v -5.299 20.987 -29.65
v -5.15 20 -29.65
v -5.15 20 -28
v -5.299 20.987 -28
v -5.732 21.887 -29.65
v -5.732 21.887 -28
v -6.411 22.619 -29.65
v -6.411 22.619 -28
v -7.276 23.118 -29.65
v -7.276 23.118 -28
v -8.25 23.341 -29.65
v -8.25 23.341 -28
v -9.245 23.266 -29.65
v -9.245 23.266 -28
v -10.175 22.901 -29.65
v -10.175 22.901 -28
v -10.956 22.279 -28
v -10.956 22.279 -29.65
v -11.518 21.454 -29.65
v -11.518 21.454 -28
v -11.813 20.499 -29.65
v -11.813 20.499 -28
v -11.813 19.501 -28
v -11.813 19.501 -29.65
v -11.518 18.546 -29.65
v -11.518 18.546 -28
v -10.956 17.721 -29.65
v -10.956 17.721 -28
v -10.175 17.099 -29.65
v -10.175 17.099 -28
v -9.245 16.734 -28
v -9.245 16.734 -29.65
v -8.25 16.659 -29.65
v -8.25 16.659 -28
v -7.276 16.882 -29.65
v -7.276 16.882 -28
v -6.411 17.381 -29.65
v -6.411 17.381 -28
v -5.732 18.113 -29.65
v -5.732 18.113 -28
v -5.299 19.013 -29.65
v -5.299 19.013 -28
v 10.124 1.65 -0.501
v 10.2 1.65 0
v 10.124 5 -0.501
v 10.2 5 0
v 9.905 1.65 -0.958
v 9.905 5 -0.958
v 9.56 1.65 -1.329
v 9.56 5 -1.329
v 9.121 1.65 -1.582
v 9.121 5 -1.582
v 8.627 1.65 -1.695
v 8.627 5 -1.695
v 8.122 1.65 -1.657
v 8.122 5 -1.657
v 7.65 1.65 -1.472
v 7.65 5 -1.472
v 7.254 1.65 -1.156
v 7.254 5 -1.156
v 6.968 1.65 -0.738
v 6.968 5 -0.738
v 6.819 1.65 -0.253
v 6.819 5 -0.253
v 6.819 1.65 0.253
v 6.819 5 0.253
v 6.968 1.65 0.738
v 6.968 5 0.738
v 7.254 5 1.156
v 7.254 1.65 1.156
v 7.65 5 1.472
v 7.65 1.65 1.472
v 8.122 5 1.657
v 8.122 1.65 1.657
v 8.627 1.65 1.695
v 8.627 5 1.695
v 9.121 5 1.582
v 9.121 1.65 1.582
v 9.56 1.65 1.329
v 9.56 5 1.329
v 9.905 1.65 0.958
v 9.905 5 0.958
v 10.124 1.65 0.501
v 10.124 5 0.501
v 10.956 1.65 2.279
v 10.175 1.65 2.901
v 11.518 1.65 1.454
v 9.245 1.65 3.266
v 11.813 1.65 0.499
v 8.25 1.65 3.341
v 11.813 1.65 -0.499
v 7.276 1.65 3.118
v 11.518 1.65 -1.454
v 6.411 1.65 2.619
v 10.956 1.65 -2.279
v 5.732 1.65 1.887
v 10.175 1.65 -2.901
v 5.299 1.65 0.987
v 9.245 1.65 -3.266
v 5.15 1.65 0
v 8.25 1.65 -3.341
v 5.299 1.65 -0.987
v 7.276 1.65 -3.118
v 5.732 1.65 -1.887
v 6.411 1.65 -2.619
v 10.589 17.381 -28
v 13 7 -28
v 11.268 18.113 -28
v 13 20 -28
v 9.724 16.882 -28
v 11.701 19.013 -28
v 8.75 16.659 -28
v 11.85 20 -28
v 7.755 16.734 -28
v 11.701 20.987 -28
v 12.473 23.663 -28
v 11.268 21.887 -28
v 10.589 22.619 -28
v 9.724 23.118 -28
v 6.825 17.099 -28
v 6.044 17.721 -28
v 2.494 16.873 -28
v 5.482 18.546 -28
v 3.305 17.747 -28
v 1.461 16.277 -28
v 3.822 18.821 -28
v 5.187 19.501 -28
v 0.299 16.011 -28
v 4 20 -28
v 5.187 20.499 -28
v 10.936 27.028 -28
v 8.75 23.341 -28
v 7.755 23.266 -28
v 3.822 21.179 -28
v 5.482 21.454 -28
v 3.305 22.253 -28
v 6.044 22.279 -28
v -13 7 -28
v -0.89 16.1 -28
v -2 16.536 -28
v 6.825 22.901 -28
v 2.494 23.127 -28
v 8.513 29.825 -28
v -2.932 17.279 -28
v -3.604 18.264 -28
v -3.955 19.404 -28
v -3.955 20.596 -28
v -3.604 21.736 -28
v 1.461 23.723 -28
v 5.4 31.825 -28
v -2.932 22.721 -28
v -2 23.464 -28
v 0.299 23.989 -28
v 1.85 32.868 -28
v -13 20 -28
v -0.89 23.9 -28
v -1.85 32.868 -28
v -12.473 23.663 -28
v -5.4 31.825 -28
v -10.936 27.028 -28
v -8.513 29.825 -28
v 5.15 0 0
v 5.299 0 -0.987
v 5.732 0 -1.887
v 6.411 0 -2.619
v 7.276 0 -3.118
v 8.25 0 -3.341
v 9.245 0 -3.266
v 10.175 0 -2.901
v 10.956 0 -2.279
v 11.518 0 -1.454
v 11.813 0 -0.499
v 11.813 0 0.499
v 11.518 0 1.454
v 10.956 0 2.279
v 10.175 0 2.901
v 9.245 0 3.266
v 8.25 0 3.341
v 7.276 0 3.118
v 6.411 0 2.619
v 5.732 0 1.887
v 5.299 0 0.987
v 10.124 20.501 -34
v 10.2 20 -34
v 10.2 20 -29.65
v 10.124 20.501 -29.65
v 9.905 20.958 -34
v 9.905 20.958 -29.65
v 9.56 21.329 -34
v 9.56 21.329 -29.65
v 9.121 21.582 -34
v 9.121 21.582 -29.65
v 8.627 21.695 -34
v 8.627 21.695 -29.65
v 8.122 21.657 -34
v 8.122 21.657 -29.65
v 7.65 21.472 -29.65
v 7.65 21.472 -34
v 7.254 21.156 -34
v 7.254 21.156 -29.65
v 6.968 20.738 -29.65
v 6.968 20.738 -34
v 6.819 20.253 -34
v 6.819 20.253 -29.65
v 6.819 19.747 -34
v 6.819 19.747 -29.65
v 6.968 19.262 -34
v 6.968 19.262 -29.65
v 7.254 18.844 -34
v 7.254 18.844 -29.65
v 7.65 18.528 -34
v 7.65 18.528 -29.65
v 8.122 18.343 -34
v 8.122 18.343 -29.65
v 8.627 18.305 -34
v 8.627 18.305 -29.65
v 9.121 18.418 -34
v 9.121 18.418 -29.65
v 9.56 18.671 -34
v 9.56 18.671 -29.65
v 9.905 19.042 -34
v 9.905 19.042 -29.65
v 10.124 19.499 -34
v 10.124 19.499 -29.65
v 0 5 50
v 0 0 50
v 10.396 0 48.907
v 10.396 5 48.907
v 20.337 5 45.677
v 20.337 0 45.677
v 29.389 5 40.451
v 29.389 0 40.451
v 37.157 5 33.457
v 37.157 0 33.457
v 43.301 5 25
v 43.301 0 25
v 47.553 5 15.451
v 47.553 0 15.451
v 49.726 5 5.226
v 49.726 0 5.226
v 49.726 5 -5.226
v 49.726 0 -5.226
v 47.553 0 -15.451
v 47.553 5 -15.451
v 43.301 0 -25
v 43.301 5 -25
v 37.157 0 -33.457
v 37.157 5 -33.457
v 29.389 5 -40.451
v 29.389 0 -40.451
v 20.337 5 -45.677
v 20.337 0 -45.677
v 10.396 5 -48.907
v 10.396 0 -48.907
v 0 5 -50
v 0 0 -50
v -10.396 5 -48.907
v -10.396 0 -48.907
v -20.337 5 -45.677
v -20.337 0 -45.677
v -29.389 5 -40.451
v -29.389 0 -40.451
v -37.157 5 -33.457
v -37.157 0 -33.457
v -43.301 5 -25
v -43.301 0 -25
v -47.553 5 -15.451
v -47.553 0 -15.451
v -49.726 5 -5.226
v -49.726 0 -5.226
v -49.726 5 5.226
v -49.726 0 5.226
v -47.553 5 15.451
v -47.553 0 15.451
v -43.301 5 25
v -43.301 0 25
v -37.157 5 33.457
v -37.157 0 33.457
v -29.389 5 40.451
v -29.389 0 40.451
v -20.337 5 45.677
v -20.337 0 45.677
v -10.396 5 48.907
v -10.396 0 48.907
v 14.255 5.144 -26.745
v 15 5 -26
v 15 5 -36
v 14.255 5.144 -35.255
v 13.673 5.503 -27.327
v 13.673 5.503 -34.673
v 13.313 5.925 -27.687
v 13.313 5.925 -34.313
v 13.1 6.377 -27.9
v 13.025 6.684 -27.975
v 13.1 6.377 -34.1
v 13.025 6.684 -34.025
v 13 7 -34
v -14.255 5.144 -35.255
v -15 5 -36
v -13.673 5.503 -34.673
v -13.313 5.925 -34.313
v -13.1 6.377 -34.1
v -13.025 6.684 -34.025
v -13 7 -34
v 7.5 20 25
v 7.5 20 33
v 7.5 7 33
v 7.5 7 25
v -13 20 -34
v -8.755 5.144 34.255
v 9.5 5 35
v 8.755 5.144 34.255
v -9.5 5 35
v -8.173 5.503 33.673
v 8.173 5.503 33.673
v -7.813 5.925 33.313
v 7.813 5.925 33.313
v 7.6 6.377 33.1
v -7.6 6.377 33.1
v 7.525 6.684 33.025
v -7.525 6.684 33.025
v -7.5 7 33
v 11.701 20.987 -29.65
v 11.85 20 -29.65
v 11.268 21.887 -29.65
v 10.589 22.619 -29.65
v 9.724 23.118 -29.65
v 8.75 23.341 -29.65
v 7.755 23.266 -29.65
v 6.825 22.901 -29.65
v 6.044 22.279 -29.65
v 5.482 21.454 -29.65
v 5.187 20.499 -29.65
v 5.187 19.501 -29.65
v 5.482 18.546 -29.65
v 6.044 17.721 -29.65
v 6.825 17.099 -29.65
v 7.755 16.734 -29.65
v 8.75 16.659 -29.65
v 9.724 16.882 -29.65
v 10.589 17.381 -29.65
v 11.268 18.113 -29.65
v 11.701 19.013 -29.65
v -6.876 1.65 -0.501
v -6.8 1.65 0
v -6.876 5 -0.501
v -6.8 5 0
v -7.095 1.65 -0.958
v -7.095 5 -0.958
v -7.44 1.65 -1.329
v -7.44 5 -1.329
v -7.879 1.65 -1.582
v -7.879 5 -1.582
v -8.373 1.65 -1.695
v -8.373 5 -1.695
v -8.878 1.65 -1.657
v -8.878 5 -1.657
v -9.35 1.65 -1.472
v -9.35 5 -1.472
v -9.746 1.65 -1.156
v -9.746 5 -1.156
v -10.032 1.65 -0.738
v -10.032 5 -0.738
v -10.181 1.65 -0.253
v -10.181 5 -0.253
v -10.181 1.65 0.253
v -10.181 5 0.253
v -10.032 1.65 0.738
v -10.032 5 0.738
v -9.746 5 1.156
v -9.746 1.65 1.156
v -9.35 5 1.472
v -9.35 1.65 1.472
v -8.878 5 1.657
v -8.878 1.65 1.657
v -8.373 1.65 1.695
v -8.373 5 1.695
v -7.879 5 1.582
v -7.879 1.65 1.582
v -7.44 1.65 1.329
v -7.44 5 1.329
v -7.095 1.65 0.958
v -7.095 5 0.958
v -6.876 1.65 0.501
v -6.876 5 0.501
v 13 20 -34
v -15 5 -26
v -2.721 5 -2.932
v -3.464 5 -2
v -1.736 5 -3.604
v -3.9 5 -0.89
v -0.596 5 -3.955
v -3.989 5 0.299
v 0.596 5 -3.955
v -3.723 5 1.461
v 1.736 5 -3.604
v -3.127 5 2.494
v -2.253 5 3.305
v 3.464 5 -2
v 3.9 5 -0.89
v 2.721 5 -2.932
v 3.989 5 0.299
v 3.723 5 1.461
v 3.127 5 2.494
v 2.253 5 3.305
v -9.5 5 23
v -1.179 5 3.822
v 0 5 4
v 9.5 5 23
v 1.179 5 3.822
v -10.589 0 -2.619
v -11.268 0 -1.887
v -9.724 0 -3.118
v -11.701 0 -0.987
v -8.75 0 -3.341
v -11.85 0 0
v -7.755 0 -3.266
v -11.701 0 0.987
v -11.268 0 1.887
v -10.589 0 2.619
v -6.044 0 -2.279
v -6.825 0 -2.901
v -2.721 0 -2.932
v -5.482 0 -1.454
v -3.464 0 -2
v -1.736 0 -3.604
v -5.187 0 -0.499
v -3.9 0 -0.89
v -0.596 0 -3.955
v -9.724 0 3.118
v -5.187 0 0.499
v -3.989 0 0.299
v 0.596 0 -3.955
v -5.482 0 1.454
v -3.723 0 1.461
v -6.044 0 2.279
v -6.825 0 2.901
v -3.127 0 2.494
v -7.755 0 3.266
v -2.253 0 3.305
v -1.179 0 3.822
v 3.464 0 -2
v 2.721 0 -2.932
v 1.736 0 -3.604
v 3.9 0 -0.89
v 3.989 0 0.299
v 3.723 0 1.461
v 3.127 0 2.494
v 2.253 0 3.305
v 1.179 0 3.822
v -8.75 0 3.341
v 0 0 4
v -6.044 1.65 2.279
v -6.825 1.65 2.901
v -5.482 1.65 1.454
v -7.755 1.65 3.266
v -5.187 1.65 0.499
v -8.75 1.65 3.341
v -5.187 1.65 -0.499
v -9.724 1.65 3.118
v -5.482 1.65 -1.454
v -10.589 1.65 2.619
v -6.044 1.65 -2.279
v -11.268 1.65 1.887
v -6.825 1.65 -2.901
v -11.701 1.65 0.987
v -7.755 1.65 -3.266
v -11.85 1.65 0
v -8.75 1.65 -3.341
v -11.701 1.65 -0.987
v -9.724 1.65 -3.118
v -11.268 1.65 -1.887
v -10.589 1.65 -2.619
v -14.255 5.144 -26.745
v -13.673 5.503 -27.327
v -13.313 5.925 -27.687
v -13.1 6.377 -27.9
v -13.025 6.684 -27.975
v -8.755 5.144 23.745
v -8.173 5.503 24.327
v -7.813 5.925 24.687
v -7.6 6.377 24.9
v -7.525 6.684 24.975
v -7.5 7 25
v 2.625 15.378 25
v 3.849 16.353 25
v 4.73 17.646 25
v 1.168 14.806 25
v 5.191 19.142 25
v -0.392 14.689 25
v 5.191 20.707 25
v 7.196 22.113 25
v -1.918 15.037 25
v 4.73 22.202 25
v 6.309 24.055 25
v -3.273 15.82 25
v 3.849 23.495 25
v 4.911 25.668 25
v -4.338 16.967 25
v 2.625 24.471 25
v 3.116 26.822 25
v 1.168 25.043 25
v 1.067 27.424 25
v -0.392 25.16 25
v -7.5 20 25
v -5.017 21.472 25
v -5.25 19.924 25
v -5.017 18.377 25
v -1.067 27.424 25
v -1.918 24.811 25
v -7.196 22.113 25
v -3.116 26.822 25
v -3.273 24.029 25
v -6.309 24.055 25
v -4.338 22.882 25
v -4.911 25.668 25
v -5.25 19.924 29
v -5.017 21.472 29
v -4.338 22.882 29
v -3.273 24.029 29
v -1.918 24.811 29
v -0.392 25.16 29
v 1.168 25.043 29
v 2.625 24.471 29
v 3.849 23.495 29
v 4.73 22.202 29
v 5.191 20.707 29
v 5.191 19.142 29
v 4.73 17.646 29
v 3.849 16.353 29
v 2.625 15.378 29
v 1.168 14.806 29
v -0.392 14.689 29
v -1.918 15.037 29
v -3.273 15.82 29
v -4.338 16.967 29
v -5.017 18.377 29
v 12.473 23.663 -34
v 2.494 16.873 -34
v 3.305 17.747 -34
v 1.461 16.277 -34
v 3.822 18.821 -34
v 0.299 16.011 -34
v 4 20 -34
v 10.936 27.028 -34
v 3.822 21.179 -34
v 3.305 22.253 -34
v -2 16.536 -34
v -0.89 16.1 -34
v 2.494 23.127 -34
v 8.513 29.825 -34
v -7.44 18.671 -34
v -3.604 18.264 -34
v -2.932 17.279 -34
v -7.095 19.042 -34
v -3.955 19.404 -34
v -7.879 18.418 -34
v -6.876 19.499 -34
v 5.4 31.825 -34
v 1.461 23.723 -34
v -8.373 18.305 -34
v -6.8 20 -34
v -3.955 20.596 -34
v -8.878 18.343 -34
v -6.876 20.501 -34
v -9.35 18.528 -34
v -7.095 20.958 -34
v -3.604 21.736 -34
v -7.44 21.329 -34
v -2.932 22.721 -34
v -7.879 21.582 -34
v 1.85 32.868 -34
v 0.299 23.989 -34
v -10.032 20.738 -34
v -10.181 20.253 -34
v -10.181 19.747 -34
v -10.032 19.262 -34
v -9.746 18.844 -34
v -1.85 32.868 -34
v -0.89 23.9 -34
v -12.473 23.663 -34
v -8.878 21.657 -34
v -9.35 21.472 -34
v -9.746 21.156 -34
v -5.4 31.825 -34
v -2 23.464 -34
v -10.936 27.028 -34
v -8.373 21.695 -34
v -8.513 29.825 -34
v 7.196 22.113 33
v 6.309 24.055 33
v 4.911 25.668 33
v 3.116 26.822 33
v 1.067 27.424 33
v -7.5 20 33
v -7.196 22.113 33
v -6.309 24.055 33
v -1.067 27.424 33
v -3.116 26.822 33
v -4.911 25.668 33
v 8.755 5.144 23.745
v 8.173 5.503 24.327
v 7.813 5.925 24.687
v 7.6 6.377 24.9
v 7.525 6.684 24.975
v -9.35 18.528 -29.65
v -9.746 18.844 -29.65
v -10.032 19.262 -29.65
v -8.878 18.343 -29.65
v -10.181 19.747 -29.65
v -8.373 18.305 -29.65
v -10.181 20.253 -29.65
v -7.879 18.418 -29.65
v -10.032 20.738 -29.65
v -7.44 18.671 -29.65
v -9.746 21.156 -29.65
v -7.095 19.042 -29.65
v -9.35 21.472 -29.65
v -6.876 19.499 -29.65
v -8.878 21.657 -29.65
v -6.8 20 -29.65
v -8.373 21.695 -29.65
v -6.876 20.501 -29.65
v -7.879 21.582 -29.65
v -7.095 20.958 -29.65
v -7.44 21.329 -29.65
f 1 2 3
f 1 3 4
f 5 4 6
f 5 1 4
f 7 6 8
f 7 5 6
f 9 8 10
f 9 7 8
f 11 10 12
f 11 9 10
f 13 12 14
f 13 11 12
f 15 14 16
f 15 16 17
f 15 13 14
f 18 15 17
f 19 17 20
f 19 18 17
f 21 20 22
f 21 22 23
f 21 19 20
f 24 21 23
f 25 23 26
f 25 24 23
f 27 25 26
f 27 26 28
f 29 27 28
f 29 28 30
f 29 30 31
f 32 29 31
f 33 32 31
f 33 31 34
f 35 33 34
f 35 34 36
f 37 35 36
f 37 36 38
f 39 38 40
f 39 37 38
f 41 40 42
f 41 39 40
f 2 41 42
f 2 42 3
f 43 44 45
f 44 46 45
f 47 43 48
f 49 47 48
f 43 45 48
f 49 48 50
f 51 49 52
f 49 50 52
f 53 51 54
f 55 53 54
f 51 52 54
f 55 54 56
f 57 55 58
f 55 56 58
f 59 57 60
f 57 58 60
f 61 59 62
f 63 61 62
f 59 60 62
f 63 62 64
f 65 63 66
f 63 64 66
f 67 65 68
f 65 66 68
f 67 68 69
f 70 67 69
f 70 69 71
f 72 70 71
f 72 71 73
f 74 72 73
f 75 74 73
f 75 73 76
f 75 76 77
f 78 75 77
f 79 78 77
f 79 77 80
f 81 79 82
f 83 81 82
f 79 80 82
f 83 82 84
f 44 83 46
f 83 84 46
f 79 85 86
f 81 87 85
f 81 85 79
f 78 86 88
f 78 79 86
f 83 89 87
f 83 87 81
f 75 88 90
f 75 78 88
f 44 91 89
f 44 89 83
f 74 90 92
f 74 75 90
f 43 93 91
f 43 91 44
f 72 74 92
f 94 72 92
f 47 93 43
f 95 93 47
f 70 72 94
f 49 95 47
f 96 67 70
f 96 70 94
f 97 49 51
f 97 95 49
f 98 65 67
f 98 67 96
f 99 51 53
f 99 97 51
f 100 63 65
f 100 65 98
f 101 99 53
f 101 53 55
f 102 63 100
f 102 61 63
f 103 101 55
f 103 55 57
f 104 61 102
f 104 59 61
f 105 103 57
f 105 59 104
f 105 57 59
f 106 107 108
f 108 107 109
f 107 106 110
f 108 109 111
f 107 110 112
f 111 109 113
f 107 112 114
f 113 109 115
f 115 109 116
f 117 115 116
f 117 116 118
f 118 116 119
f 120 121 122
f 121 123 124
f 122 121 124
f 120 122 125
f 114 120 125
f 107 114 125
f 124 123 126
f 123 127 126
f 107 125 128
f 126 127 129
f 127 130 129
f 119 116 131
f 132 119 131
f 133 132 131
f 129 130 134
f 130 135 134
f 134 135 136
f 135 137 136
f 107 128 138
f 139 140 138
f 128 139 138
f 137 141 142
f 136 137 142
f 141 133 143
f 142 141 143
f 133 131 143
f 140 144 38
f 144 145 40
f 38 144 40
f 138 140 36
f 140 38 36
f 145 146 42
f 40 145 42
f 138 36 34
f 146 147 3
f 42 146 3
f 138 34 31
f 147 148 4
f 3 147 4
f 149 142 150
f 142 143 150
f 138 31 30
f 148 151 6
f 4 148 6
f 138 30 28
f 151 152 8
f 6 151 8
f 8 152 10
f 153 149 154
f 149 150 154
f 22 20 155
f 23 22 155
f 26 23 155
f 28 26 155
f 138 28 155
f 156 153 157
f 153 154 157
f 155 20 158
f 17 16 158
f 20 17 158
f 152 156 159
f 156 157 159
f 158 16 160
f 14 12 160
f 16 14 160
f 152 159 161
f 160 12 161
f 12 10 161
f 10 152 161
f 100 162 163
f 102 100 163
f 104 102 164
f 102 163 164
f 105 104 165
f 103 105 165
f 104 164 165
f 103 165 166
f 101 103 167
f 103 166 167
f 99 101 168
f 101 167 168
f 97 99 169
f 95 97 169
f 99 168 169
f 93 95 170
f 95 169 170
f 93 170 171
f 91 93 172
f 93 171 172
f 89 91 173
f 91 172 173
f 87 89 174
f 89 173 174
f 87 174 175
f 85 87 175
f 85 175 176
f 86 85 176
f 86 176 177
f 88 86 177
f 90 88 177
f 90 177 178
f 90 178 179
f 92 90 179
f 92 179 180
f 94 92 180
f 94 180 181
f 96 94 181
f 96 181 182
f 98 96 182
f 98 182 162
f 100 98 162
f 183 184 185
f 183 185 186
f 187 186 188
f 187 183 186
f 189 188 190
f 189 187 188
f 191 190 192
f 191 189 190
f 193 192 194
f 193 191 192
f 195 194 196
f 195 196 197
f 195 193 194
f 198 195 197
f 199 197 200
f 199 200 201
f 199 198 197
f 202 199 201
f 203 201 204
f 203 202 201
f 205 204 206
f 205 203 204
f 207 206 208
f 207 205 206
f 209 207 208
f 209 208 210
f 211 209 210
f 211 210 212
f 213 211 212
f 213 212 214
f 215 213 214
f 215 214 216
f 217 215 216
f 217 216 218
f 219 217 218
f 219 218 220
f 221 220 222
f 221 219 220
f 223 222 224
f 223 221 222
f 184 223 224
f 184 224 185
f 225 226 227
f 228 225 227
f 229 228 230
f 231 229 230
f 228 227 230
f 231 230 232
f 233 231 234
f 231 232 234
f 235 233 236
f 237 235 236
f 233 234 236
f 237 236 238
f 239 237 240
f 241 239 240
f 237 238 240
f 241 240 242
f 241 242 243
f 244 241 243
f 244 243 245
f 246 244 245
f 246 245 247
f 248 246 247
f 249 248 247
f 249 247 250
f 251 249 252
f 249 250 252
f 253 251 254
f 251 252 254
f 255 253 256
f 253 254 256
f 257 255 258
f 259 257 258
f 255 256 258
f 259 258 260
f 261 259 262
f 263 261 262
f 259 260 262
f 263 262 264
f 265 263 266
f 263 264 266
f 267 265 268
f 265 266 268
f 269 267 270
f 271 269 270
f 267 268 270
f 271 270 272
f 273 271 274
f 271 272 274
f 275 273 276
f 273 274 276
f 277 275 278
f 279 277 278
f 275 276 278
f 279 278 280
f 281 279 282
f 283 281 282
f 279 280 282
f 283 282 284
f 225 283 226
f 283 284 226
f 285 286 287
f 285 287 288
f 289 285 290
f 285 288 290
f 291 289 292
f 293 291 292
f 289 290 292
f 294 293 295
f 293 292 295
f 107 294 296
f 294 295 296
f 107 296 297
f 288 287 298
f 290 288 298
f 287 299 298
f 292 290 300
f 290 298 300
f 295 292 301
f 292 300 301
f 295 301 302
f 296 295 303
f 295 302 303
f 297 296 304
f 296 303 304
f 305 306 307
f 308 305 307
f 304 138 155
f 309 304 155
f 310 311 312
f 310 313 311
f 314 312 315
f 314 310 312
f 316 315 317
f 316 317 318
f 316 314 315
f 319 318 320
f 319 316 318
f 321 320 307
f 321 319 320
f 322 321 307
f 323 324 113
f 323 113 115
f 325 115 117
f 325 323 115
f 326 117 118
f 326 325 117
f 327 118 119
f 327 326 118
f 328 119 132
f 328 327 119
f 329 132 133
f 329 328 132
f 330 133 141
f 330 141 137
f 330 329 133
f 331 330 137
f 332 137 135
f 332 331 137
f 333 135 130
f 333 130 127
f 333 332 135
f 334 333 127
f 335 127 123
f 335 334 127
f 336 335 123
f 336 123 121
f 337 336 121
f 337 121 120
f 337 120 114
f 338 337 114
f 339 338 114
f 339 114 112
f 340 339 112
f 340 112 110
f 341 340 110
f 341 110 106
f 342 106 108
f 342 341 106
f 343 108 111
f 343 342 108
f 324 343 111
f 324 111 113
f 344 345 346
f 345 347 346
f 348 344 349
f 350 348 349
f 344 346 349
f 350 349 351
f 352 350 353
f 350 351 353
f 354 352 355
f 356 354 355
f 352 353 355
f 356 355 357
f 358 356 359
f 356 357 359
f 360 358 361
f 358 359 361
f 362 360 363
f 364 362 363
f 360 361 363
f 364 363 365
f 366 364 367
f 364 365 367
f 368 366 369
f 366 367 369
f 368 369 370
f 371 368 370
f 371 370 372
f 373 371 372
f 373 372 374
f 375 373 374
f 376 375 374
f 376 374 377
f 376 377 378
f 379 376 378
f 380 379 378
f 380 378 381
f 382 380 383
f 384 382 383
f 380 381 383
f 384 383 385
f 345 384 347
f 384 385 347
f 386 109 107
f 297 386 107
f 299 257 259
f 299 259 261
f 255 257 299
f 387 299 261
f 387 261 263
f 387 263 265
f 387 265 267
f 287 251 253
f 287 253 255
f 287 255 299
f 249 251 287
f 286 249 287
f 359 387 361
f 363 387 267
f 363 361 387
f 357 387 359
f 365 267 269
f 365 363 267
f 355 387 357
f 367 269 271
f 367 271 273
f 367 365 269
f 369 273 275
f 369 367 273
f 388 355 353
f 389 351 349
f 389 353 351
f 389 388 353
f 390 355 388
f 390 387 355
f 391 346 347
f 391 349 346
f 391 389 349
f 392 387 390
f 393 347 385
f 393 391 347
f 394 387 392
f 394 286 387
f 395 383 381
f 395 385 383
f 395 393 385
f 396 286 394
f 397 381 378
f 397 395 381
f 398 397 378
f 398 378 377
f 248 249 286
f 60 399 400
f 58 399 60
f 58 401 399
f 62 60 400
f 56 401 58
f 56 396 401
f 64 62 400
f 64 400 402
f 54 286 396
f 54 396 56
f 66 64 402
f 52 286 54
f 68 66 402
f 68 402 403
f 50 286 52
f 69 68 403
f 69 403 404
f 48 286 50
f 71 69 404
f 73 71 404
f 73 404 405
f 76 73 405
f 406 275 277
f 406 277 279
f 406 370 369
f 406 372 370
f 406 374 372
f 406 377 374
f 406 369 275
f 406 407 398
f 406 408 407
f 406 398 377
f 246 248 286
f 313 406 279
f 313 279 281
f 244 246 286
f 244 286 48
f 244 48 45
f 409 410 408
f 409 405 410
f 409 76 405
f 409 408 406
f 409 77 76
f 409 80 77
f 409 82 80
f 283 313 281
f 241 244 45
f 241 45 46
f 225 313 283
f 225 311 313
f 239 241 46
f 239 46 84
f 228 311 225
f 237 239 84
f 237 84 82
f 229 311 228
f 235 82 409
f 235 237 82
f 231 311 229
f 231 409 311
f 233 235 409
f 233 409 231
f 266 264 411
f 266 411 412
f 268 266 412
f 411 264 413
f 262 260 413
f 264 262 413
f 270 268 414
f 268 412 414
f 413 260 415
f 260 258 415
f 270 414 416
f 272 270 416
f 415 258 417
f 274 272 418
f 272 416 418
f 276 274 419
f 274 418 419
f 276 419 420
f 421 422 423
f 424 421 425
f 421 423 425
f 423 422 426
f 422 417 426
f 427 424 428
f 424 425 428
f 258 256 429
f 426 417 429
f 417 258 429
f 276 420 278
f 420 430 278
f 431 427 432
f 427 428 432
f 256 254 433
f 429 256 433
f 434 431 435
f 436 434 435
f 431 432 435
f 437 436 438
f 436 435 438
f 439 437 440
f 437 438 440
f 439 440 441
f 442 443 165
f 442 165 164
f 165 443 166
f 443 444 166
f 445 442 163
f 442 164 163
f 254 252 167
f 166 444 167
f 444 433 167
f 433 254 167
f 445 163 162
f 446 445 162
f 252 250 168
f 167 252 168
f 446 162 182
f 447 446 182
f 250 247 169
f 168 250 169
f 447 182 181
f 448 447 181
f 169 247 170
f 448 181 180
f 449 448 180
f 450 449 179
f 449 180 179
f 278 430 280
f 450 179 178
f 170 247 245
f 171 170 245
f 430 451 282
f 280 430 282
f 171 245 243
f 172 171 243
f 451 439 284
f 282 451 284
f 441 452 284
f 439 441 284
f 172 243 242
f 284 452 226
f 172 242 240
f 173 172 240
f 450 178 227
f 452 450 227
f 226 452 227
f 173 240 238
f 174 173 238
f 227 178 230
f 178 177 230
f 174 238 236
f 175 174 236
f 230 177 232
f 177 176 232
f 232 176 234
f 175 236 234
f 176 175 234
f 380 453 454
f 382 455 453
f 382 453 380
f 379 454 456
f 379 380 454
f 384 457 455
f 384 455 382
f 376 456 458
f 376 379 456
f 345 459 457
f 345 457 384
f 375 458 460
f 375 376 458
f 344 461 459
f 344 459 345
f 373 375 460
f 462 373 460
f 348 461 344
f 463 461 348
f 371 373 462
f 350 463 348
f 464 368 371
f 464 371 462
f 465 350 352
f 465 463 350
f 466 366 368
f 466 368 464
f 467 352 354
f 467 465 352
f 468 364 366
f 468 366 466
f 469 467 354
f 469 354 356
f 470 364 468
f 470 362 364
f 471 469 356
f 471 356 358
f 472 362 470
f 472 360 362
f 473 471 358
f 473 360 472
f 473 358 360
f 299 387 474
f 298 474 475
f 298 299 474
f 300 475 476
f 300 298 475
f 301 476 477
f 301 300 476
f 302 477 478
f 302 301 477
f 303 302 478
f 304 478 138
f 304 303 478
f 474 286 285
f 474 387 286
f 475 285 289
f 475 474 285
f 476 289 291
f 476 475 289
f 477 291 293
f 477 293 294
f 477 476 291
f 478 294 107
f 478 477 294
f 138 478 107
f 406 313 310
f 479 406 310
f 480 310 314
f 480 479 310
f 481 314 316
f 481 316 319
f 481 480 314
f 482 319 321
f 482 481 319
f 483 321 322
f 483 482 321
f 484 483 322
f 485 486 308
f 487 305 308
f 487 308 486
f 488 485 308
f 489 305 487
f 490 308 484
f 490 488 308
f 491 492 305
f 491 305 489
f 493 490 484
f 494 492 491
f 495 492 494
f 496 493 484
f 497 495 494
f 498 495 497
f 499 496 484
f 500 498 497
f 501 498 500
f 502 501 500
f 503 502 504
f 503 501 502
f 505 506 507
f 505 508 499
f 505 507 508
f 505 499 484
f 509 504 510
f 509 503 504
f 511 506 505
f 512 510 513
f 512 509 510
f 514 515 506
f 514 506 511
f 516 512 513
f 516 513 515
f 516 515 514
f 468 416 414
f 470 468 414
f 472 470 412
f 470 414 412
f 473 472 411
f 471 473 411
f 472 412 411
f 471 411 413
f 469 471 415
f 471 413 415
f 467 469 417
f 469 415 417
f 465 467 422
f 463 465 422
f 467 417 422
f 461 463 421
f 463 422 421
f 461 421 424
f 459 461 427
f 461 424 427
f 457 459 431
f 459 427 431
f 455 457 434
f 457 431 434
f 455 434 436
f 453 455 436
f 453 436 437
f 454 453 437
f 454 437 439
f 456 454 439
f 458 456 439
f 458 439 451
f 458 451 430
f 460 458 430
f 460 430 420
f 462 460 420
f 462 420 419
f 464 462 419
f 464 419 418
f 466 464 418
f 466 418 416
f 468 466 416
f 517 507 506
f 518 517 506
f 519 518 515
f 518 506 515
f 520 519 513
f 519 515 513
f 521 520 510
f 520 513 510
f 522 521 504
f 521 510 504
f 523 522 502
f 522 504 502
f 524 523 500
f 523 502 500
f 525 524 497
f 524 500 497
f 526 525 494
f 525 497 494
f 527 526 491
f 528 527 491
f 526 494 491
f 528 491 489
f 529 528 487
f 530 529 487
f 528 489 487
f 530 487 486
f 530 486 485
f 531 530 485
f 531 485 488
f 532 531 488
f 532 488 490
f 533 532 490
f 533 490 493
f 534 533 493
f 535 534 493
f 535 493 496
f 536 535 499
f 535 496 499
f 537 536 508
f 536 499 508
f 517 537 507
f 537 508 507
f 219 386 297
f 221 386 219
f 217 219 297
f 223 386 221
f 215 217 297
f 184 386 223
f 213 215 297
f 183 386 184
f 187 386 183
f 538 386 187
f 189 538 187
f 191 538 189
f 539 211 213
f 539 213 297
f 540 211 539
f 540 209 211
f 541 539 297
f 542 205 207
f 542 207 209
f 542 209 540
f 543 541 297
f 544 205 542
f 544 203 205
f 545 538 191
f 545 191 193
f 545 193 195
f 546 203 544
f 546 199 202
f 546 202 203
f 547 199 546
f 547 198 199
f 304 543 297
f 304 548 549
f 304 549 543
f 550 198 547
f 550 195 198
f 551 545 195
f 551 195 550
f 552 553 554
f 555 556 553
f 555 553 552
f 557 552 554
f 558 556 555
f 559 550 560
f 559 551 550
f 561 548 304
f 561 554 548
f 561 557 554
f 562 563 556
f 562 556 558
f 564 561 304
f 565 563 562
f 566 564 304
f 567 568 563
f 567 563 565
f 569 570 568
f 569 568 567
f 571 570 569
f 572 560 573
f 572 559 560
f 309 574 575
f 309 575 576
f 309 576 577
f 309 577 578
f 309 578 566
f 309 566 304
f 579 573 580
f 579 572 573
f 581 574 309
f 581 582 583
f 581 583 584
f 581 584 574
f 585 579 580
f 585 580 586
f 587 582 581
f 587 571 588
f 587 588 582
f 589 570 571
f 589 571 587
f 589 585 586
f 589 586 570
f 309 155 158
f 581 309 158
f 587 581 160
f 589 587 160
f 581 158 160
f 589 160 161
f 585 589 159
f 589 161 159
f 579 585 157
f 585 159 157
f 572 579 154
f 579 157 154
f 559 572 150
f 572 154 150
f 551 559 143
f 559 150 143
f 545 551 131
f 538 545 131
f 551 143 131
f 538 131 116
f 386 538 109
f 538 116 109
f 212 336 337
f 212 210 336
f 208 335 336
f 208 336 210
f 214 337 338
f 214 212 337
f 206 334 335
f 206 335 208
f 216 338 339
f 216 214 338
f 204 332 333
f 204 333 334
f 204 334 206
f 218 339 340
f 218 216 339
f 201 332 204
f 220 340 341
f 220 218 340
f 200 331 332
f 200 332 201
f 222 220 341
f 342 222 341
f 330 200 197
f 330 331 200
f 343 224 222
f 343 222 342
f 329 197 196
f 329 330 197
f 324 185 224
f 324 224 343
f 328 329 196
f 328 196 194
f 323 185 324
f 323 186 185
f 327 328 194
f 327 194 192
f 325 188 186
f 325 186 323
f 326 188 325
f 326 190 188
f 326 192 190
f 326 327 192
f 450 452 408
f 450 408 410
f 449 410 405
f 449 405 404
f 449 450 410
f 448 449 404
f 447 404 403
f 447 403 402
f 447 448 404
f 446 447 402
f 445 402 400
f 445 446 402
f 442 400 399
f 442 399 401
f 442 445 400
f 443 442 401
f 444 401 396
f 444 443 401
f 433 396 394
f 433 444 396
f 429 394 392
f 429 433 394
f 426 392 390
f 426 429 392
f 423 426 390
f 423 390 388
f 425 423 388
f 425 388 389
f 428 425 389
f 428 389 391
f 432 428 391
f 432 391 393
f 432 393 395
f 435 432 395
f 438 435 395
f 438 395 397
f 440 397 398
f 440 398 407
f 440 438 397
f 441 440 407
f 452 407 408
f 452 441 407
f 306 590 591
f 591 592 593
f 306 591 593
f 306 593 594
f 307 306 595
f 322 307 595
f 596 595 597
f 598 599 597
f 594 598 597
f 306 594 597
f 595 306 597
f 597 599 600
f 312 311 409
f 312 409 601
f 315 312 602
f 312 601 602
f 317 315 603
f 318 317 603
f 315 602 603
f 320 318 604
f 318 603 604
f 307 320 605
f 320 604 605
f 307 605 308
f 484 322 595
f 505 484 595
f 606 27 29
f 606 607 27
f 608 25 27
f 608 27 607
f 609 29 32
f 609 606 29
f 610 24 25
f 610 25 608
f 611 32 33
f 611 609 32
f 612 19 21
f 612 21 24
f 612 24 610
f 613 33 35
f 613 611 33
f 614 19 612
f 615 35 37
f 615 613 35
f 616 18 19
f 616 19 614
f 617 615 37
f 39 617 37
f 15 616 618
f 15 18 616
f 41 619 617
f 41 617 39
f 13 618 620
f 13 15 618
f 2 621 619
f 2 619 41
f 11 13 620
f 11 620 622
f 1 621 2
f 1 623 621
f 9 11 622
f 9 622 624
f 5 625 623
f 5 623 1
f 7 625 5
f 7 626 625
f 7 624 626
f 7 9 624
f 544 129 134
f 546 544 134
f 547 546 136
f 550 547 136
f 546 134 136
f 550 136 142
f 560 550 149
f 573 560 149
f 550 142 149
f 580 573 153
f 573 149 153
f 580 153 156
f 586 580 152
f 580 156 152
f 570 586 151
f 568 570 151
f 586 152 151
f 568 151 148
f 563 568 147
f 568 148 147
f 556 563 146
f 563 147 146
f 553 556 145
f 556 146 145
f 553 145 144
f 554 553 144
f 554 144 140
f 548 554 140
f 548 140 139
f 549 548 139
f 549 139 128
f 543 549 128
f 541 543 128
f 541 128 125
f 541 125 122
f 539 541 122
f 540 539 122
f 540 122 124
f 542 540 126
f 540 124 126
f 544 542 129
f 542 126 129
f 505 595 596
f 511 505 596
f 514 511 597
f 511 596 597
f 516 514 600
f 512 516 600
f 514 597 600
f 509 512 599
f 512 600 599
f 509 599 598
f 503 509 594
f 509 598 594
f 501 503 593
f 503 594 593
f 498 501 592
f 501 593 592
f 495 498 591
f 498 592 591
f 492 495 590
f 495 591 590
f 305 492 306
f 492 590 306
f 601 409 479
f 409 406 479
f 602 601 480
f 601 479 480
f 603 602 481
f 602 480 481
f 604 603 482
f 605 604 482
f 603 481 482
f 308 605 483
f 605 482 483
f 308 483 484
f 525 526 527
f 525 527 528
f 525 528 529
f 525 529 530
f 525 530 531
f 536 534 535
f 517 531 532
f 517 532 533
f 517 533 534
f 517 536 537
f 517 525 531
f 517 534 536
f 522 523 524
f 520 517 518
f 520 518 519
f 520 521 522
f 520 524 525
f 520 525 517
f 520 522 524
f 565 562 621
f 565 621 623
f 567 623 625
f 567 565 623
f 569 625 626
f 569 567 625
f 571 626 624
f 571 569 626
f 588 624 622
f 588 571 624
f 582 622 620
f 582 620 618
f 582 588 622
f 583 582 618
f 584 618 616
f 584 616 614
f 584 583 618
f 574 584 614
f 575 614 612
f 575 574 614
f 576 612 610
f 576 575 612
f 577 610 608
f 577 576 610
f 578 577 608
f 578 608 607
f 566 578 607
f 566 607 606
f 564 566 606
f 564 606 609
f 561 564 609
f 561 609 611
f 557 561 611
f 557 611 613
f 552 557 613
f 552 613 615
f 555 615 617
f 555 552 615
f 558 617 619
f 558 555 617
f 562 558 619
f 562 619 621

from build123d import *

# Parameters (mm, degrees)
SKETCH1_R                       = 50
SKETCH1_R_2                     = 4
BOSS_EXTRUDE1_DEPTH             = 5
BOSS_EXTRUDE4_DEPTH             = 6
BOSS_EXTRUDE5_DEPTH             = 8
CBORE_FOR_M3_SBHCS1_D           = 3.4
CBORE_FOR_M3_SBHCS1_CBORE_D     = 6.7
CBORE_FOR_M3_SBHCS1_CBORE_DEPTH = 1.65
CBORE_START                     = -29.65
CBORE_FOR_M3_SBHCS2_OUTLINE_R   = 3.35
CBORE_FOR_M3_SBHCS2_DEPTH       = 1.65
CBORE_START_2                   = -34
CBORE_FOR_M3_SBHCS2_2_OUTLINE_R = 1.7
CBORE_FOR_M3_SBHCS2_2_DEPTH     = 4.35
SKETCH29_R                      = 4
CUT_EXTRUDE1_DEPTH              = 6
SKETCH30_R                      = 5.25
CUT_EXTRUDE2_DEPTH              = 4
FILLET1_R                       = 2


# Read off the part's stored shape, not the designer's step: CBORE for M3 SBHCS2
with BuildPart() as part:
    # Sketch1 → Boss-Extrude1 (new body)
    with BuildSketch(Plane(origin=(0, 0, 0), x_dir=(1, 0, 0), z_dir=(0, 1, 0))):
        with Locations(Location((0, 0, 0), (0, 0, 270))):
            Circle(SKETCH1_R)
        with Locations(Location((0, 0, 0), (0, 0, 270))):
            Circle(SKETCH1_R_2, mode=Mode.SUBTRACT)
    extrude(amount=BOSS_EXTRUDE1_DEPTH)

    # Sketch2 → Boss-Extrude4 (add)
    with BuildSketch(Plane.XY.offset(-28)):
        with BuildLine():
            Line((-13, 5), (-13, 20))
            ThreePointArc((-13, 20), (0, 33), (13, 20))
            Line((13, 20), (13, 5))
            Line((13, 5), (-13, 5))
        make_face()
    extrude(amount=-BOSS_EXTRUDE4_DEPTH)

    # Sketch24 → Boss-Extrude5 (add)
    with BuildSketch(Plane.XY.offset(33)):
        with BuildLine():
            Line((-7.5, 5), (-7.5, 20))
            ThreePointArc((-7.5, 20), (0, 27.5), (7.5, 20))
            Line((7.5, 20), (7.5, 5))
            Line((7.5, 5), (-7.5, 5))
        make_face()
    extrude(amount=-BOSS_EXTRUDE5_DEPTH)

    # CBORE for M3 SBHCS1 (through all)
    with Locations(Plane(origin=(0, 0, 0), x_dir=(-1, 0, 0), z_dir=(0, -1, 0))):
        with Locations((-8.5, 0), (8.5, 0)):
            CounterBoreHole(CBORE_FOR_M3_SBHCS1_D / 2, CBORE_FOR_M3_SBHCS1_CBORE_D / 2, CBORE_FOR_M3_SBHCS1_CBORE_DEPTH)

    # CBORE for M3 SBHCS2 outline → CBORE for M3 SBHCS2 (cut)
    with BuildSketch(Plane.XY.offset(CBORE_START)):
        with Locations((-8.5, 20)):
            Circle(CBORE_FOR_M3_SBHCS2_OUTLINE_R)
        with Locations((8.5, 20)):
            Circle(CBORE_FOR_M3_SBHCS2_OUTLINE_R)
    extrude(amount=CBORE_FOR_M3_SBHCS2_DEPTH, mode=Mode.SUBTRACT)

    # CBORE for M3 SBHCS2 2 outline → CBORE for M3 SBHCS2 2 (cut)
    with BuildSketch(Plane.XY.offset(CBORE_START_2)):
        with Locations((-8.5, 20)):
            Circle(CBORE_FOR_M3_SBHCS2_2_OUTLINE_R)
        with Locations((8.5, 20)):
            Circle(CBORE_FOR_M3_SBHCS2_2_OUTLINE_R)
    extrude(amount=CBORE_FOR_M3_SBHCS2_2_DEPTH, mode=Mode.SUBTRACT)

    # Sketch29 → Cut-Extrude1 (cut)
    with BuildSketch(Plane.XY.offset(-28)):
        with Locations((0, 20)):
            Circle(SKETCH29_R)
    extrude(amount=-CUT_EXTRUDE1_DEPTH, mode=Mode.SUBTRACT)

    # Sketch30 → Cut-Extrude2 (cut)
    with BuildSketch(Plane(origin=(0, 0, 25), x_dir=(-1, 0, 0), z_dir=(0, 0, -1))):
        with Locations((0, 19.924351103)):
            Circle(SKETCH30_R)
    extrude(amount=-CUT_EXTRUDE2_DEPTH, mode=Mode.SUBTRACT)

    # Fillet1
    fillet1_edges = [part.edges().sort_by_distance(p)[0] for p in [
        (0, 5, -34),
        (13, 5, -31),
        (-13, 5, -31),
        (0, 5, -28),
        (0, 5, 25),
        (7.5, 5, 29),
        (-7.5, 5, 29),
        (0, 5, 33),
    ]]
    fillet(fillet1_edges, radius=FILLET1_R)


solid = part.part
